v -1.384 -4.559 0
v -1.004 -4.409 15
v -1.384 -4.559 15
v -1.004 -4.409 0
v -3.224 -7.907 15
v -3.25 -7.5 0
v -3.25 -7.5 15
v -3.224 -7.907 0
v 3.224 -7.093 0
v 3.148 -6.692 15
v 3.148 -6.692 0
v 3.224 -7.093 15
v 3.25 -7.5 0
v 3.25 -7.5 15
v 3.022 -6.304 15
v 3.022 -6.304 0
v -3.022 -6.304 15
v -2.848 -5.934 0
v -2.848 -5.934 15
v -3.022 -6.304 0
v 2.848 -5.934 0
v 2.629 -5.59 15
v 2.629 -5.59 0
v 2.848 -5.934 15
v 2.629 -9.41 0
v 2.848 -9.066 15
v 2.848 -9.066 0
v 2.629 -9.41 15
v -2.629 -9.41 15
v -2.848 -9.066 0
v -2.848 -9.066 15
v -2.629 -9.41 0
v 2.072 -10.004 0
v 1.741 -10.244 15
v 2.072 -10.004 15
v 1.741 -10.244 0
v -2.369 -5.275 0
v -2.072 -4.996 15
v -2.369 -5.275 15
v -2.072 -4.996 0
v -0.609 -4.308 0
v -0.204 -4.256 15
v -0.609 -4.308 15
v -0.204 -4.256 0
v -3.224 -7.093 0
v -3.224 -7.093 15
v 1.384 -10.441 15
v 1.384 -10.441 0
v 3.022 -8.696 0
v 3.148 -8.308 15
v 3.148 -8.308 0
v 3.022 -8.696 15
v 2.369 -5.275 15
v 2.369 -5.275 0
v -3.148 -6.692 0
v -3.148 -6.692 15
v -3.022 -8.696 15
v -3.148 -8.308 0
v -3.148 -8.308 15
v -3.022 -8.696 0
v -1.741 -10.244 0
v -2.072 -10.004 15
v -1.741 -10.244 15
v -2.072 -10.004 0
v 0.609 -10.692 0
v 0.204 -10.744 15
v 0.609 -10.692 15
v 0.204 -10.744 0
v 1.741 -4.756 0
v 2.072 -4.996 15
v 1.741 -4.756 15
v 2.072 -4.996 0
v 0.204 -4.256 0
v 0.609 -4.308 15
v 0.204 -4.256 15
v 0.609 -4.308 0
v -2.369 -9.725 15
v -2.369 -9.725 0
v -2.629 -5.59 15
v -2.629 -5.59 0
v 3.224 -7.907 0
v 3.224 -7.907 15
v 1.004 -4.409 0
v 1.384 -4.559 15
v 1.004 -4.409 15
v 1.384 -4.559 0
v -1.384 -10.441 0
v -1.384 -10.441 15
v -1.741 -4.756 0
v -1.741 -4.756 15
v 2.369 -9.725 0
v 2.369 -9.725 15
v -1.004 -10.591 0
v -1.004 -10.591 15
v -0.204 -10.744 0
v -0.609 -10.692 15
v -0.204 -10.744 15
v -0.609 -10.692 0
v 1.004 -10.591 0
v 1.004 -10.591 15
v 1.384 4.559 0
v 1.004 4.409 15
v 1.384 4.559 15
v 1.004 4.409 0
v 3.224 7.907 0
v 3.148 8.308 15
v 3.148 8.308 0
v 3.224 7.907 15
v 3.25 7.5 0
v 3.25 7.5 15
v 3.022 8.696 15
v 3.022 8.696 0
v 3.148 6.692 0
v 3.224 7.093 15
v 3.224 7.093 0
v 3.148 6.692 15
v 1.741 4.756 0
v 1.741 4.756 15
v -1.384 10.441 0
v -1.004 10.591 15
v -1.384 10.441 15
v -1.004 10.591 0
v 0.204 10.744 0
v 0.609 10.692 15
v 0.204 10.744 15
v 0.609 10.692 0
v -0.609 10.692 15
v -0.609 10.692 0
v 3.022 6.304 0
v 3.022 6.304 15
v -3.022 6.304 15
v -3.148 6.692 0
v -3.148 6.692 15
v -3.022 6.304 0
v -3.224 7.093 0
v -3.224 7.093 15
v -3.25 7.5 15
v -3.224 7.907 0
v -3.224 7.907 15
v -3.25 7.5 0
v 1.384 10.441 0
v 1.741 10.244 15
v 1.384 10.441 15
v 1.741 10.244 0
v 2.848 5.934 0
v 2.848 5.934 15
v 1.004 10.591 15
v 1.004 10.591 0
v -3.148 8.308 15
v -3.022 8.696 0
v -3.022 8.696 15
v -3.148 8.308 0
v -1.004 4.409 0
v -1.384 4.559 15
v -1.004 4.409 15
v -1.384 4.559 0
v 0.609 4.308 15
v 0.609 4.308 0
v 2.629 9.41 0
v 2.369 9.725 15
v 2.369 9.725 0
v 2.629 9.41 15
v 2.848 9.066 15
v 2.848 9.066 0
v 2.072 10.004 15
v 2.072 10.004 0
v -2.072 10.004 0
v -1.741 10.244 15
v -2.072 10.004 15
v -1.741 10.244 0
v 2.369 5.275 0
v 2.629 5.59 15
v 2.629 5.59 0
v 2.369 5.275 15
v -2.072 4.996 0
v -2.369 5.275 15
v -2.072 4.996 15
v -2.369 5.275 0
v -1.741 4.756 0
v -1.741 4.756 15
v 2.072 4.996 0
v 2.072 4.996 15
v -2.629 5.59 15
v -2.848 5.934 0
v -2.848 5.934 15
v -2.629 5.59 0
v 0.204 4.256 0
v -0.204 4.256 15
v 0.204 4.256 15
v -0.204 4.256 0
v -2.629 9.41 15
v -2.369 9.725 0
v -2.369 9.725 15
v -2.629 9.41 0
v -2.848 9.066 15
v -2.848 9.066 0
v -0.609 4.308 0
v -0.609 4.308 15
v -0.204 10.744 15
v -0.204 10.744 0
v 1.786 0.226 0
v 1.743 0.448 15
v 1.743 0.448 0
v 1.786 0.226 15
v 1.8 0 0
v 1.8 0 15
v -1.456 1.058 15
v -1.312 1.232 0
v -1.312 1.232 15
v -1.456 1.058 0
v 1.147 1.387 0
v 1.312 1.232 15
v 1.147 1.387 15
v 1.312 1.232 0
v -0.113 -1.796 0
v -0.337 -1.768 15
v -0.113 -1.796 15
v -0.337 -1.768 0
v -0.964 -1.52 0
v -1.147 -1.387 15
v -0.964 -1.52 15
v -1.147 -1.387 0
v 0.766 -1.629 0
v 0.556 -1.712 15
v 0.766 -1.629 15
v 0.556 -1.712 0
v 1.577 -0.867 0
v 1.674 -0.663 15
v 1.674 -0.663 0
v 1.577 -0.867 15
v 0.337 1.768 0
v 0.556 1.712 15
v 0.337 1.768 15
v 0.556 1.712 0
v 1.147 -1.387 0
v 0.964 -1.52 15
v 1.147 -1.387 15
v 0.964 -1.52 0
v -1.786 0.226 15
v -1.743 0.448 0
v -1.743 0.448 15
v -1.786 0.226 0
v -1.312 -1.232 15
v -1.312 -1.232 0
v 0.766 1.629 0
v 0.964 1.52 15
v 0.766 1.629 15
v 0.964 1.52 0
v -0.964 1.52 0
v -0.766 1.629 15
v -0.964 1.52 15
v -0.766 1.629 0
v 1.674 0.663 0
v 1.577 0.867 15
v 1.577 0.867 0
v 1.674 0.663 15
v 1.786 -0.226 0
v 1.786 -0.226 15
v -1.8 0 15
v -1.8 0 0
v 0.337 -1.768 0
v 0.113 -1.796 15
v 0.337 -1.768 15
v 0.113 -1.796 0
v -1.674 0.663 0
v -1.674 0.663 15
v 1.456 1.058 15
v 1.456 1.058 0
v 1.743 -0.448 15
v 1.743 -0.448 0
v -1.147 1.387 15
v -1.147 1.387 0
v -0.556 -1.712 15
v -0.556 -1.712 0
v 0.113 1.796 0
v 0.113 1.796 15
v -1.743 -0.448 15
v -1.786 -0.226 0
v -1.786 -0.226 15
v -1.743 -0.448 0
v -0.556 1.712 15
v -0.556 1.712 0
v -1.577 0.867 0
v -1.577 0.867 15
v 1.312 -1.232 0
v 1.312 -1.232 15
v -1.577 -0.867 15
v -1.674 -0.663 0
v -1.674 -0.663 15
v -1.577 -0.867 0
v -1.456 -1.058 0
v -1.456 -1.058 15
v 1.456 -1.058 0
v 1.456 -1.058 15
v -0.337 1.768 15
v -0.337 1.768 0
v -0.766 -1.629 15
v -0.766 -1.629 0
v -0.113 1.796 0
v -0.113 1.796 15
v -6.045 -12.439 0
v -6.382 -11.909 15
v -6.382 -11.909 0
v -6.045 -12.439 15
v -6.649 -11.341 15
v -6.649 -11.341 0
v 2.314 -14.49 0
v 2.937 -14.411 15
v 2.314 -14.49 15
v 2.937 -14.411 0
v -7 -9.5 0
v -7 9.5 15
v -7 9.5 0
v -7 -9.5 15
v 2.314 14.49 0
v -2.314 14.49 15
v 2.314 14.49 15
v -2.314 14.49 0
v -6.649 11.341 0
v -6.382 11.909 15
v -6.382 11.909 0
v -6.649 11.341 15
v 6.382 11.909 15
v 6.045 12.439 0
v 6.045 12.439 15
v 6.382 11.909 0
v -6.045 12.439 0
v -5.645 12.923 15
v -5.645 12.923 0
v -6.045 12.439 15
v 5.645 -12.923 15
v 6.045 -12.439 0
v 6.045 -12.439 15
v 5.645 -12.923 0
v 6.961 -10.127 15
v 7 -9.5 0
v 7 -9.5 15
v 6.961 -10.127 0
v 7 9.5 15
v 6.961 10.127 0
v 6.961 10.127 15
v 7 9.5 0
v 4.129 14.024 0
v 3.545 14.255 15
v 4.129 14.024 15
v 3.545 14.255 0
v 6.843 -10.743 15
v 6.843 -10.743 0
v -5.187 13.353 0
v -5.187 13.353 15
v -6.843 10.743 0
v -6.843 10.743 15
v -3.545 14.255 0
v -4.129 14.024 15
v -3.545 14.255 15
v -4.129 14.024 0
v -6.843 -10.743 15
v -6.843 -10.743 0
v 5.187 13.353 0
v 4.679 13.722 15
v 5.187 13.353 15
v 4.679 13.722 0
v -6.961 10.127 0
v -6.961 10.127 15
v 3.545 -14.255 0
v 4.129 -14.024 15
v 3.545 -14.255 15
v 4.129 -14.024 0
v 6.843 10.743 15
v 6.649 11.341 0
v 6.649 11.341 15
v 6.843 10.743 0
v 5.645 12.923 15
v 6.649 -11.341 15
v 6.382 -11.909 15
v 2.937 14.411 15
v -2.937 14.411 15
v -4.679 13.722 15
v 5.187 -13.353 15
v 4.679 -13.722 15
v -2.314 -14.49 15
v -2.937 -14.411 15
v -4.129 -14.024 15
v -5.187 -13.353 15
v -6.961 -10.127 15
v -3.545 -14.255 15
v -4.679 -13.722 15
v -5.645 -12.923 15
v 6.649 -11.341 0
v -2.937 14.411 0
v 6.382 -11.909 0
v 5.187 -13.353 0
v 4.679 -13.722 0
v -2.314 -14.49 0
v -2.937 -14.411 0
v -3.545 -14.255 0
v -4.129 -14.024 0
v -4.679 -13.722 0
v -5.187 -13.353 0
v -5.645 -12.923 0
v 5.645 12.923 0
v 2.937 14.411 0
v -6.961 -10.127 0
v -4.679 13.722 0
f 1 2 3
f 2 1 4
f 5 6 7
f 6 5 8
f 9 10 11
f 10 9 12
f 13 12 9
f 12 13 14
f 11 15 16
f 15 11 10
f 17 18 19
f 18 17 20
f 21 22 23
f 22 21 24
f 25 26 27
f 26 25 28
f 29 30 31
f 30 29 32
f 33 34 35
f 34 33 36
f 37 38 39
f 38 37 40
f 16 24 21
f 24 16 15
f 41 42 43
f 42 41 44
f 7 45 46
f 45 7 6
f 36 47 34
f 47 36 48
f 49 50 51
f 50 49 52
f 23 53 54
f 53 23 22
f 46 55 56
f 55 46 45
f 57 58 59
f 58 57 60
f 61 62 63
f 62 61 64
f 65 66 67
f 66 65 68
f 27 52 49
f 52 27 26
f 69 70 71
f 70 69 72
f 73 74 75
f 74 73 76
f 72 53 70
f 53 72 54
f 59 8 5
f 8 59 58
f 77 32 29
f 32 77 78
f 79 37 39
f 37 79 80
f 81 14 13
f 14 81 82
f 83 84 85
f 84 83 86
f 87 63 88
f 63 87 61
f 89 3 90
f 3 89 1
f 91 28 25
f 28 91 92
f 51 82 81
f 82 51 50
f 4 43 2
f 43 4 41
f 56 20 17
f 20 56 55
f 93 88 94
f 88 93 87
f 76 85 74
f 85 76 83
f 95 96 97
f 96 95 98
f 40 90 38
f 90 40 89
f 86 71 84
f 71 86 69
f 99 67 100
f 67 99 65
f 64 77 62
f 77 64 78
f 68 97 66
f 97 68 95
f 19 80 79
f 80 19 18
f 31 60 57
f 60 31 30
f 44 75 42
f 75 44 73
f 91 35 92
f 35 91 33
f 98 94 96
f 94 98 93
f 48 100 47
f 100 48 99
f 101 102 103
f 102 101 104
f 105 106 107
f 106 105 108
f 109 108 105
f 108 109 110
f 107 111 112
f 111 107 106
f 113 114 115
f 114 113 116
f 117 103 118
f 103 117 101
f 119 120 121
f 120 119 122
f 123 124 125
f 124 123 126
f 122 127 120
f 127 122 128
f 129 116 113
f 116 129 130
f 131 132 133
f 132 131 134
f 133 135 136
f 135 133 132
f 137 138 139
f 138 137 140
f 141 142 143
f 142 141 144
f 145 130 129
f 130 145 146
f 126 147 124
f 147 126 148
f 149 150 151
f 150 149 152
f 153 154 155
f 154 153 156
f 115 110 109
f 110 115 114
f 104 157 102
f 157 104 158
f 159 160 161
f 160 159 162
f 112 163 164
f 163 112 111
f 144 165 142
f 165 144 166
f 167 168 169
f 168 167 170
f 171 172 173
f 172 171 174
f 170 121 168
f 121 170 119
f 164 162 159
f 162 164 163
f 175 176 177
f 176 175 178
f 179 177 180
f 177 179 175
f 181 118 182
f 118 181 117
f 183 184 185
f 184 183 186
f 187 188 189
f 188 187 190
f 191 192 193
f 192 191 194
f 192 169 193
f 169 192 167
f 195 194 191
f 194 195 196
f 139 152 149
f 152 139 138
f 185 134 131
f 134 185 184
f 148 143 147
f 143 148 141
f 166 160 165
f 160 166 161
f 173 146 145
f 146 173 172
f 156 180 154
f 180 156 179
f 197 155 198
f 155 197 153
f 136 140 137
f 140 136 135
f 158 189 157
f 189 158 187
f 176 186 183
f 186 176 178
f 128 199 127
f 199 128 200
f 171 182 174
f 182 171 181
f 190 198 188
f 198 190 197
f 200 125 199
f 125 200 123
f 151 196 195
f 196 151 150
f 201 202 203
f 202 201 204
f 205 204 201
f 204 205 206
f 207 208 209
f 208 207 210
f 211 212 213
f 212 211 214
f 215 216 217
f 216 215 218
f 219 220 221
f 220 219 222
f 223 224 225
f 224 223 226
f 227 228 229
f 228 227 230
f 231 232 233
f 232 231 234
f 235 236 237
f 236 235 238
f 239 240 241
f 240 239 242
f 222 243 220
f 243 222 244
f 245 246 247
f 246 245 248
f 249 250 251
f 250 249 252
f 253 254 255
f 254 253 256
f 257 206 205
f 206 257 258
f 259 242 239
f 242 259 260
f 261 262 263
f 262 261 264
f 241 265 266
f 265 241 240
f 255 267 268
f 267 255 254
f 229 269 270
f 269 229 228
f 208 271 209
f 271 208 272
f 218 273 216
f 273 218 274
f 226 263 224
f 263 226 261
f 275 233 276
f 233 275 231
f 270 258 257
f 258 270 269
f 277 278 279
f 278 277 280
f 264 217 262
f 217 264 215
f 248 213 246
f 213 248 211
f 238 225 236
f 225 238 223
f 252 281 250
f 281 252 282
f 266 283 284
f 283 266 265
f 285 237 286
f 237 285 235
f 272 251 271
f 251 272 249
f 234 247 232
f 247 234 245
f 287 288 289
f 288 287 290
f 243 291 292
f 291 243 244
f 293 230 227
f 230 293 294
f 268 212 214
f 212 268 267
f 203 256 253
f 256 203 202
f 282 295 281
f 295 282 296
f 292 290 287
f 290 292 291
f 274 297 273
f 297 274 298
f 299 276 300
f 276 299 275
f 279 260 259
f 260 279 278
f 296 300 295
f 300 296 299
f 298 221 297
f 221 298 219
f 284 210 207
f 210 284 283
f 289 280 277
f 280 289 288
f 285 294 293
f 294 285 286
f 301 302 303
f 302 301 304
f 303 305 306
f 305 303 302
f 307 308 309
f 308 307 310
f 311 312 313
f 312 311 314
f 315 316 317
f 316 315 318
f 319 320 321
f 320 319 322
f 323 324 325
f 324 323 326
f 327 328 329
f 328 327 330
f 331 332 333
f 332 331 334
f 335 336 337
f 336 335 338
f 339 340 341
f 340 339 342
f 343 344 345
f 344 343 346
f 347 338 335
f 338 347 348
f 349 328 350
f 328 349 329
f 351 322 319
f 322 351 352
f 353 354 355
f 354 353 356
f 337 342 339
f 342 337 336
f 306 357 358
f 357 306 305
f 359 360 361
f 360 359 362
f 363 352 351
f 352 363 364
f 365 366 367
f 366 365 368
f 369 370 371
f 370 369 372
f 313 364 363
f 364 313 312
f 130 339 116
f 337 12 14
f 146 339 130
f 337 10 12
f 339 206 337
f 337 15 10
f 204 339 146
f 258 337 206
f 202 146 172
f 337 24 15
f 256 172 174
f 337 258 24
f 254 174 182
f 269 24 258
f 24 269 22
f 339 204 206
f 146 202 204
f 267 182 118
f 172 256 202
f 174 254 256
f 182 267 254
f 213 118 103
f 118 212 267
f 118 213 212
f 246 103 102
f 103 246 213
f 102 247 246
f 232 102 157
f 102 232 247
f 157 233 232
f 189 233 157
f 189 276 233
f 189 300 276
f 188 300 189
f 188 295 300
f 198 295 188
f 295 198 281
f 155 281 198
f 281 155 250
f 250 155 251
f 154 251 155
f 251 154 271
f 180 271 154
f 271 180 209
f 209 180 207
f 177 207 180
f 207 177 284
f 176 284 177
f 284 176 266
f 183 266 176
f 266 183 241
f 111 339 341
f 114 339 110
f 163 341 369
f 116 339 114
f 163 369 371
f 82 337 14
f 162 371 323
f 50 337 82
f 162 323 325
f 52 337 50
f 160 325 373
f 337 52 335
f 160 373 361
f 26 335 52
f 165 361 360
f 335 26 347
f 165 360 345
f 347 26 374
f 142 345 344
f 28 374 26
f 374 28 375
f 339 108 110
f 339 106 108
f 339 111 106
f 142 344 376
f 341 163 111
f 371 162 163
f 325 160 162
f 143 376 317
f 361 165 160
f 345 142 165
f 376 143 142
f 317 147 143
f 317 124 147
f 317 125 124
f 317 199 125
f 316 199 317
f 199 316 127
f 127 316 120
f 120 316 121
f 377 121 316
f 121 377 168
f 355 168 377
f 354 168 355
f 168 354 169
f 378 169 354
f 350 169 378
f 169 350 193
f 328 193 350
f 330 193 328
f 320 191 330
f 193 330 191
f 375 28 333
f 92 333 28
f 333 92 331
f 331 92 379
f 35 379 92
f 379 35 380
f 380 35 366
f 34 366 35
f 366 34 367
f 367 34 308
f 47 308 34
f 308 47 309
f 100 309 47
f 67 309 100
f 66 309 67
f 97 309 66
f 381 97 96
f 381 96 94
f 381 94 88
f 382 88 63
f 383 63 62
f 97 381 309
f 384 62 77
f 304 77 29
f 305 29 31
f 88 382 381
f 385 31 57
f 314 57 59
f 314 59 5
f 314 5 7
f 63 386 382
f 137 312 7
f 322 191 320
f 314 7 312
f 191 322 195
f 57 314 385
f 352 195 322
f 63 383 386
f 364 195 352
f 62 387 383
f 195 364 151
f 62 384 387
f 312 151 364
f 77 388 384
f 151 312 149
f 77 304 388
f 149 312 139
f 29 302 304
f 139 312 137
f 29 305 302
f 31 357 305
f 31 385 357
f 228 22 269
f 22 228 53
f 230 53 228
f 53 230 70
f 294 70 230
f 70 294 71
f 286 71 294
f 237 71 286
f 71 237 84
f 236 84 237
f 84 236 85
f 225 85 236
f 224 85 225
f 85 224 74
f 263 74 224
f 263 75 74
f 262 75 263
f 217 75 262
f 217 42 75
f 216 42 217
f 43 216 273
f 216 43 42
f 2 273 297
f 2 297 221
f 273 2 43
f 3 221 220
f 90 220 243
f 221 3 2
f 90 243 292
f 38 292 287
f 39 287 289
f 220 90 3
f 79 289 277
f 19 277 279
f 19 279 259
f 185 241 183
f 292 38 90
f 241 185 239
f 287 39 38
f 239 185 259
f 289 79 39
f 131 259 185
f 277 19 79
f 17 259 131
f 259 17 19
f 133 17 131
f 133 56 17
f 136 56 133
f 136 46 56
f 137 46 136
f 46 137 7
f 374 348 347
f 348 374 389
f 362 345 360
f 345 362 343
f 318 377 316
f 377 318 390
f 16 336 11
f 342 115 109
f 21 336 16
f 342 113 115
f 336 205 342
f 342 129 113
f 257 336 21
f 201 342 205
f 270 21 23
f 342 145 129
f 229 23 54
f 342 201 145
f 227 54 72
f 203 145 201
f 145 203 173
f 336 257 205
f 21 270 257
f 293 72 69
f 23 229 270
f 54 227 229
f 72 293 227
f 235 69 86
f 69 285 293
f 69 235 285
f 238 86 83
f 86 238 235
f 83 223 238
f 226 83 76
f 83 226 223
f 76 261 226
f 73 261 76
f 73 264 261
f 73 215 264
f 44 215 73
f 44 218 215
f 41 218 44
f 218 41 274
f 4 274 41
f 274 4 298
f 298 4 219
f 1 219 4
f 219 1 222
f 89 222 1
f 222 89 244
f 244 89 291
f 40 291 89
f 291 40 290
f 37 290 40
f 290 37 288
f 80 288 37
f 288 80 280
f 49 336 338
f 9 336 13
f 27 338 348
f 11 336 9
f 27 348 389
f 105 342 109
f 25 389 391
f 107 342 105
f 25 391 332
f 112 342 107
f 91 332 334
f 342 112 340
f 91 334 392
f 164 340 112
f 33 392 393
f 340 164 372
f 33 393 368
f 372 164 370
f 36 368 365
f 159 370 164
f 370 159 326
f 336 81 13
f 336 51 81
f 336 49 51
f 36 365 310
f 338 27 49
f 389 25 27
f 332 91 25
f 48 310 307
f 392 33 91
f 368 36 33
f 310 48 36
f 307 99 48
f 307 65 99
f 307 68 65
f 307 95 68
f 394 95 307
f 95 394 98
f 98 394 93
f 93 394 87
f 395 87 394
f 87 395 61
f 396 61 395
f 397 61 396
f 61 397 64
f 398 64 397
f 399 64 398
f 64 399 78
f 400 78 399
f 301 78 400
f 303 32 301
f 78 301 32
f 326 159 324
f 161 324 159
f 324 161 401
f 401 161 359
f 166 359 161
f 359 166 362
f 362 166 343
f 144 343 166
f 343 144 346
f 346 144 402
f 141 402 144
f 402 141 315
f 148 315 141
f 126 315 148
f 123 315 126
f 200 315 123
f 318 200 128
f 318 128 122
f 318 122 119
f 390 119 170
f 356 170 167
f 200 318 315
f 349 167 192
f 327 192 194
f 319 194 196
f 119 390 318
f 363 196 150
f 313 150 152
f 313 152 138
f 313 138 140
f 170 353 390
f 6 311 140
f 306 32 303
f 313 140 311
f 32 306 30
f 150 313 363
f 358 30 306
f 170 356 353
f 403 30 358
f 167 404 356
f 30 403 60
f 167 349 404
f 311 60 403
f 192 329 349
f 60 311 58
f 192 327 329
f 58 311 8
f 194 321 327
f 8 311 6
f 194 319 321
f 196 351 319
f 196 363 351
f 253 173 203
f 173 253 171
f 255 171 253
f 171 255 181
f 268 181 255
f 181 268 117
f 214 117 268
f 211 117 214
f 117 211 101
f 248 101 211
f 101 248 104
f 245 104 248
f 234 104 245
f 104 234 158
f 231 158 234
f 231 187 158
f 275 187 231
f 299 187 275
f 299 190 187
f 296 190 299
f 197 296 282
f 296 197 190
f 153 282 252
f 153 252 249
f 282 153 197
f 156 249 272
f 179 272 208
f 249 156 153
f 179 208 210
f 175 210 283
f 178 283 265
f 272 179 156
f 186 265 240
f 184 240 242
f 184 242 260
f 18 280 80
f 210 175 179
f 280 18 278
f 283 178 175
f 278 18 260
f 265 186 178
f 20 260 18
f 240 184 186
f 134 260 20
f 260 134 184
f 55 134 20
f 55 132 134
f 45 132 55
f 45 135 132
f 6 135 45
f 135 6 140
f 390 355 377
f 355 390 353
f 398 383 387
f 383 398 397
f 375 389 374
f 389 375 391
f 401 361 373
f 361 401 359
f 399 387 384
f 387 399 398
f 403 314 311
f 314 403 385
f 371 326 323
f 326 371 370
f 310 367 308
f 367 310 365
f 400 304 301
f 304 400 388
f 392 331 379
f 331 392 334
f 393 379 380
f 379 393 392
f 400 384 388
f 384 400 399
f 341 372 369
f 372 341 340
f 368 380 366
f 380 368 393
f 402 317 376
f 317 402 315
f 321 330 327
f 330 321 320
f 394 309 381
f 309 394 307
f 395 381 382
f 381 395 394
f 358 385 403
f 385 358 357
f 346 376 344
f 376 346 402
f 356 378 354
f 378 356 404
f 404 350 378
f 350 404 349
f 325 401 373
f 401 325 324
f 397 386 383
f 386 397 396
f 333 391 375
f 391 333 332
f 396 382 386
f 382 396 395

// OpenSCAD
$fn = 50;

difference() {
	union() {
		hull() {
			translate(v = [-2.0, 9.5, 0]) {
				cylinder(h = 15, r = 5);
			}
			translate(v = [2.0, 9.5, 0]) {
				cylinder(h = 15, r = 5);
			}
			translate(v = [-2.0, -9.5, 0]) {
				cylinder(h = 15, r = 5);
			}
			translate(v = [2.0, -9.5, 0]) {
				cylinder(h = 15, r = 5);
			}
		}
	}
	union() {
		translate(v = [0.0, -7.5, 0]) {
			translate(v = [0, 0, -100]) {
				cylinder(h = 200, r = 3.25);
			}
		}
		translate(v = [0.0, 7.5, 0]) {
			translate(v = [0, 0, -100]) {
				cylinder(h = 200, r = 3.25);
			}
		}
		translate(v = [0.0, -7.5, 0]) {
			translate(v = [0, 0, -100]) {
				cylinder(h = 200, r = 1.8);
			}
		}
		translate(v = [0, 0, -100]) {
			cylinder(h = 200, r = 1.8);
		}
		translate(v = [0.0, 7.5, 0]) {
			translate(v = [0, 0, -100]) {
				cylinder(h = 200, r = 1.8);
			}
		}
	}
}
